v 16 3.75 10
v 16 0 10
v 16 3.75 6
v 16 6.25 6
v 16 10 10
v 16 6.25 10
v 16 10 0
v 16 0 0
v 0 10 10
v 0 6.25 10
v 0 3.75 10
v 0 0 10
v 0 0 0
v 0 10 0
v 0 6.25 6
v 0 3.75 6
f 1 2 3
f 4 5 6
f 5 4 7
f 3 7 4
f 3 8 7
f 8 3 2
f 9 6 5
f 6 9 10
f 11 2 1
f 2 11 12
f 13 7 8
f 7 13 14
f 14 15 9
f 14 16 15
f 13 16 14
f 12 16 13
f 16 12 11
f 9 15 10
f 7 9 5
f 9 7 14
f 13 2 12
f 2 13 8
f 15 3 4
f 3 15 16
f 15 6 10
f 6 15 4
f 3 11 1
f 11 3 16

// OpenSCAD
$fn = 32;

// ----------------------------------------------------------------------
// Micro clip: slotted block, 5-20 mm class
// ----------------------------------------------------------------------

// --- parameters (mm) ---
block_l = 16;             // block length, X
block_w = 10;             // block width, Y
block_h = 10;             // block height, Z
slot_w = 2.5;             // slot width
slot_d = 4;               // slot depth from the top

difference() {
  cube([block_l, block_w, block_h]);
  translate([-1, block_w / 2 - slot_w / 2, block_h - slot_d])
    cube([block_l + 2, slot_w, slot_d + 1]);
}
